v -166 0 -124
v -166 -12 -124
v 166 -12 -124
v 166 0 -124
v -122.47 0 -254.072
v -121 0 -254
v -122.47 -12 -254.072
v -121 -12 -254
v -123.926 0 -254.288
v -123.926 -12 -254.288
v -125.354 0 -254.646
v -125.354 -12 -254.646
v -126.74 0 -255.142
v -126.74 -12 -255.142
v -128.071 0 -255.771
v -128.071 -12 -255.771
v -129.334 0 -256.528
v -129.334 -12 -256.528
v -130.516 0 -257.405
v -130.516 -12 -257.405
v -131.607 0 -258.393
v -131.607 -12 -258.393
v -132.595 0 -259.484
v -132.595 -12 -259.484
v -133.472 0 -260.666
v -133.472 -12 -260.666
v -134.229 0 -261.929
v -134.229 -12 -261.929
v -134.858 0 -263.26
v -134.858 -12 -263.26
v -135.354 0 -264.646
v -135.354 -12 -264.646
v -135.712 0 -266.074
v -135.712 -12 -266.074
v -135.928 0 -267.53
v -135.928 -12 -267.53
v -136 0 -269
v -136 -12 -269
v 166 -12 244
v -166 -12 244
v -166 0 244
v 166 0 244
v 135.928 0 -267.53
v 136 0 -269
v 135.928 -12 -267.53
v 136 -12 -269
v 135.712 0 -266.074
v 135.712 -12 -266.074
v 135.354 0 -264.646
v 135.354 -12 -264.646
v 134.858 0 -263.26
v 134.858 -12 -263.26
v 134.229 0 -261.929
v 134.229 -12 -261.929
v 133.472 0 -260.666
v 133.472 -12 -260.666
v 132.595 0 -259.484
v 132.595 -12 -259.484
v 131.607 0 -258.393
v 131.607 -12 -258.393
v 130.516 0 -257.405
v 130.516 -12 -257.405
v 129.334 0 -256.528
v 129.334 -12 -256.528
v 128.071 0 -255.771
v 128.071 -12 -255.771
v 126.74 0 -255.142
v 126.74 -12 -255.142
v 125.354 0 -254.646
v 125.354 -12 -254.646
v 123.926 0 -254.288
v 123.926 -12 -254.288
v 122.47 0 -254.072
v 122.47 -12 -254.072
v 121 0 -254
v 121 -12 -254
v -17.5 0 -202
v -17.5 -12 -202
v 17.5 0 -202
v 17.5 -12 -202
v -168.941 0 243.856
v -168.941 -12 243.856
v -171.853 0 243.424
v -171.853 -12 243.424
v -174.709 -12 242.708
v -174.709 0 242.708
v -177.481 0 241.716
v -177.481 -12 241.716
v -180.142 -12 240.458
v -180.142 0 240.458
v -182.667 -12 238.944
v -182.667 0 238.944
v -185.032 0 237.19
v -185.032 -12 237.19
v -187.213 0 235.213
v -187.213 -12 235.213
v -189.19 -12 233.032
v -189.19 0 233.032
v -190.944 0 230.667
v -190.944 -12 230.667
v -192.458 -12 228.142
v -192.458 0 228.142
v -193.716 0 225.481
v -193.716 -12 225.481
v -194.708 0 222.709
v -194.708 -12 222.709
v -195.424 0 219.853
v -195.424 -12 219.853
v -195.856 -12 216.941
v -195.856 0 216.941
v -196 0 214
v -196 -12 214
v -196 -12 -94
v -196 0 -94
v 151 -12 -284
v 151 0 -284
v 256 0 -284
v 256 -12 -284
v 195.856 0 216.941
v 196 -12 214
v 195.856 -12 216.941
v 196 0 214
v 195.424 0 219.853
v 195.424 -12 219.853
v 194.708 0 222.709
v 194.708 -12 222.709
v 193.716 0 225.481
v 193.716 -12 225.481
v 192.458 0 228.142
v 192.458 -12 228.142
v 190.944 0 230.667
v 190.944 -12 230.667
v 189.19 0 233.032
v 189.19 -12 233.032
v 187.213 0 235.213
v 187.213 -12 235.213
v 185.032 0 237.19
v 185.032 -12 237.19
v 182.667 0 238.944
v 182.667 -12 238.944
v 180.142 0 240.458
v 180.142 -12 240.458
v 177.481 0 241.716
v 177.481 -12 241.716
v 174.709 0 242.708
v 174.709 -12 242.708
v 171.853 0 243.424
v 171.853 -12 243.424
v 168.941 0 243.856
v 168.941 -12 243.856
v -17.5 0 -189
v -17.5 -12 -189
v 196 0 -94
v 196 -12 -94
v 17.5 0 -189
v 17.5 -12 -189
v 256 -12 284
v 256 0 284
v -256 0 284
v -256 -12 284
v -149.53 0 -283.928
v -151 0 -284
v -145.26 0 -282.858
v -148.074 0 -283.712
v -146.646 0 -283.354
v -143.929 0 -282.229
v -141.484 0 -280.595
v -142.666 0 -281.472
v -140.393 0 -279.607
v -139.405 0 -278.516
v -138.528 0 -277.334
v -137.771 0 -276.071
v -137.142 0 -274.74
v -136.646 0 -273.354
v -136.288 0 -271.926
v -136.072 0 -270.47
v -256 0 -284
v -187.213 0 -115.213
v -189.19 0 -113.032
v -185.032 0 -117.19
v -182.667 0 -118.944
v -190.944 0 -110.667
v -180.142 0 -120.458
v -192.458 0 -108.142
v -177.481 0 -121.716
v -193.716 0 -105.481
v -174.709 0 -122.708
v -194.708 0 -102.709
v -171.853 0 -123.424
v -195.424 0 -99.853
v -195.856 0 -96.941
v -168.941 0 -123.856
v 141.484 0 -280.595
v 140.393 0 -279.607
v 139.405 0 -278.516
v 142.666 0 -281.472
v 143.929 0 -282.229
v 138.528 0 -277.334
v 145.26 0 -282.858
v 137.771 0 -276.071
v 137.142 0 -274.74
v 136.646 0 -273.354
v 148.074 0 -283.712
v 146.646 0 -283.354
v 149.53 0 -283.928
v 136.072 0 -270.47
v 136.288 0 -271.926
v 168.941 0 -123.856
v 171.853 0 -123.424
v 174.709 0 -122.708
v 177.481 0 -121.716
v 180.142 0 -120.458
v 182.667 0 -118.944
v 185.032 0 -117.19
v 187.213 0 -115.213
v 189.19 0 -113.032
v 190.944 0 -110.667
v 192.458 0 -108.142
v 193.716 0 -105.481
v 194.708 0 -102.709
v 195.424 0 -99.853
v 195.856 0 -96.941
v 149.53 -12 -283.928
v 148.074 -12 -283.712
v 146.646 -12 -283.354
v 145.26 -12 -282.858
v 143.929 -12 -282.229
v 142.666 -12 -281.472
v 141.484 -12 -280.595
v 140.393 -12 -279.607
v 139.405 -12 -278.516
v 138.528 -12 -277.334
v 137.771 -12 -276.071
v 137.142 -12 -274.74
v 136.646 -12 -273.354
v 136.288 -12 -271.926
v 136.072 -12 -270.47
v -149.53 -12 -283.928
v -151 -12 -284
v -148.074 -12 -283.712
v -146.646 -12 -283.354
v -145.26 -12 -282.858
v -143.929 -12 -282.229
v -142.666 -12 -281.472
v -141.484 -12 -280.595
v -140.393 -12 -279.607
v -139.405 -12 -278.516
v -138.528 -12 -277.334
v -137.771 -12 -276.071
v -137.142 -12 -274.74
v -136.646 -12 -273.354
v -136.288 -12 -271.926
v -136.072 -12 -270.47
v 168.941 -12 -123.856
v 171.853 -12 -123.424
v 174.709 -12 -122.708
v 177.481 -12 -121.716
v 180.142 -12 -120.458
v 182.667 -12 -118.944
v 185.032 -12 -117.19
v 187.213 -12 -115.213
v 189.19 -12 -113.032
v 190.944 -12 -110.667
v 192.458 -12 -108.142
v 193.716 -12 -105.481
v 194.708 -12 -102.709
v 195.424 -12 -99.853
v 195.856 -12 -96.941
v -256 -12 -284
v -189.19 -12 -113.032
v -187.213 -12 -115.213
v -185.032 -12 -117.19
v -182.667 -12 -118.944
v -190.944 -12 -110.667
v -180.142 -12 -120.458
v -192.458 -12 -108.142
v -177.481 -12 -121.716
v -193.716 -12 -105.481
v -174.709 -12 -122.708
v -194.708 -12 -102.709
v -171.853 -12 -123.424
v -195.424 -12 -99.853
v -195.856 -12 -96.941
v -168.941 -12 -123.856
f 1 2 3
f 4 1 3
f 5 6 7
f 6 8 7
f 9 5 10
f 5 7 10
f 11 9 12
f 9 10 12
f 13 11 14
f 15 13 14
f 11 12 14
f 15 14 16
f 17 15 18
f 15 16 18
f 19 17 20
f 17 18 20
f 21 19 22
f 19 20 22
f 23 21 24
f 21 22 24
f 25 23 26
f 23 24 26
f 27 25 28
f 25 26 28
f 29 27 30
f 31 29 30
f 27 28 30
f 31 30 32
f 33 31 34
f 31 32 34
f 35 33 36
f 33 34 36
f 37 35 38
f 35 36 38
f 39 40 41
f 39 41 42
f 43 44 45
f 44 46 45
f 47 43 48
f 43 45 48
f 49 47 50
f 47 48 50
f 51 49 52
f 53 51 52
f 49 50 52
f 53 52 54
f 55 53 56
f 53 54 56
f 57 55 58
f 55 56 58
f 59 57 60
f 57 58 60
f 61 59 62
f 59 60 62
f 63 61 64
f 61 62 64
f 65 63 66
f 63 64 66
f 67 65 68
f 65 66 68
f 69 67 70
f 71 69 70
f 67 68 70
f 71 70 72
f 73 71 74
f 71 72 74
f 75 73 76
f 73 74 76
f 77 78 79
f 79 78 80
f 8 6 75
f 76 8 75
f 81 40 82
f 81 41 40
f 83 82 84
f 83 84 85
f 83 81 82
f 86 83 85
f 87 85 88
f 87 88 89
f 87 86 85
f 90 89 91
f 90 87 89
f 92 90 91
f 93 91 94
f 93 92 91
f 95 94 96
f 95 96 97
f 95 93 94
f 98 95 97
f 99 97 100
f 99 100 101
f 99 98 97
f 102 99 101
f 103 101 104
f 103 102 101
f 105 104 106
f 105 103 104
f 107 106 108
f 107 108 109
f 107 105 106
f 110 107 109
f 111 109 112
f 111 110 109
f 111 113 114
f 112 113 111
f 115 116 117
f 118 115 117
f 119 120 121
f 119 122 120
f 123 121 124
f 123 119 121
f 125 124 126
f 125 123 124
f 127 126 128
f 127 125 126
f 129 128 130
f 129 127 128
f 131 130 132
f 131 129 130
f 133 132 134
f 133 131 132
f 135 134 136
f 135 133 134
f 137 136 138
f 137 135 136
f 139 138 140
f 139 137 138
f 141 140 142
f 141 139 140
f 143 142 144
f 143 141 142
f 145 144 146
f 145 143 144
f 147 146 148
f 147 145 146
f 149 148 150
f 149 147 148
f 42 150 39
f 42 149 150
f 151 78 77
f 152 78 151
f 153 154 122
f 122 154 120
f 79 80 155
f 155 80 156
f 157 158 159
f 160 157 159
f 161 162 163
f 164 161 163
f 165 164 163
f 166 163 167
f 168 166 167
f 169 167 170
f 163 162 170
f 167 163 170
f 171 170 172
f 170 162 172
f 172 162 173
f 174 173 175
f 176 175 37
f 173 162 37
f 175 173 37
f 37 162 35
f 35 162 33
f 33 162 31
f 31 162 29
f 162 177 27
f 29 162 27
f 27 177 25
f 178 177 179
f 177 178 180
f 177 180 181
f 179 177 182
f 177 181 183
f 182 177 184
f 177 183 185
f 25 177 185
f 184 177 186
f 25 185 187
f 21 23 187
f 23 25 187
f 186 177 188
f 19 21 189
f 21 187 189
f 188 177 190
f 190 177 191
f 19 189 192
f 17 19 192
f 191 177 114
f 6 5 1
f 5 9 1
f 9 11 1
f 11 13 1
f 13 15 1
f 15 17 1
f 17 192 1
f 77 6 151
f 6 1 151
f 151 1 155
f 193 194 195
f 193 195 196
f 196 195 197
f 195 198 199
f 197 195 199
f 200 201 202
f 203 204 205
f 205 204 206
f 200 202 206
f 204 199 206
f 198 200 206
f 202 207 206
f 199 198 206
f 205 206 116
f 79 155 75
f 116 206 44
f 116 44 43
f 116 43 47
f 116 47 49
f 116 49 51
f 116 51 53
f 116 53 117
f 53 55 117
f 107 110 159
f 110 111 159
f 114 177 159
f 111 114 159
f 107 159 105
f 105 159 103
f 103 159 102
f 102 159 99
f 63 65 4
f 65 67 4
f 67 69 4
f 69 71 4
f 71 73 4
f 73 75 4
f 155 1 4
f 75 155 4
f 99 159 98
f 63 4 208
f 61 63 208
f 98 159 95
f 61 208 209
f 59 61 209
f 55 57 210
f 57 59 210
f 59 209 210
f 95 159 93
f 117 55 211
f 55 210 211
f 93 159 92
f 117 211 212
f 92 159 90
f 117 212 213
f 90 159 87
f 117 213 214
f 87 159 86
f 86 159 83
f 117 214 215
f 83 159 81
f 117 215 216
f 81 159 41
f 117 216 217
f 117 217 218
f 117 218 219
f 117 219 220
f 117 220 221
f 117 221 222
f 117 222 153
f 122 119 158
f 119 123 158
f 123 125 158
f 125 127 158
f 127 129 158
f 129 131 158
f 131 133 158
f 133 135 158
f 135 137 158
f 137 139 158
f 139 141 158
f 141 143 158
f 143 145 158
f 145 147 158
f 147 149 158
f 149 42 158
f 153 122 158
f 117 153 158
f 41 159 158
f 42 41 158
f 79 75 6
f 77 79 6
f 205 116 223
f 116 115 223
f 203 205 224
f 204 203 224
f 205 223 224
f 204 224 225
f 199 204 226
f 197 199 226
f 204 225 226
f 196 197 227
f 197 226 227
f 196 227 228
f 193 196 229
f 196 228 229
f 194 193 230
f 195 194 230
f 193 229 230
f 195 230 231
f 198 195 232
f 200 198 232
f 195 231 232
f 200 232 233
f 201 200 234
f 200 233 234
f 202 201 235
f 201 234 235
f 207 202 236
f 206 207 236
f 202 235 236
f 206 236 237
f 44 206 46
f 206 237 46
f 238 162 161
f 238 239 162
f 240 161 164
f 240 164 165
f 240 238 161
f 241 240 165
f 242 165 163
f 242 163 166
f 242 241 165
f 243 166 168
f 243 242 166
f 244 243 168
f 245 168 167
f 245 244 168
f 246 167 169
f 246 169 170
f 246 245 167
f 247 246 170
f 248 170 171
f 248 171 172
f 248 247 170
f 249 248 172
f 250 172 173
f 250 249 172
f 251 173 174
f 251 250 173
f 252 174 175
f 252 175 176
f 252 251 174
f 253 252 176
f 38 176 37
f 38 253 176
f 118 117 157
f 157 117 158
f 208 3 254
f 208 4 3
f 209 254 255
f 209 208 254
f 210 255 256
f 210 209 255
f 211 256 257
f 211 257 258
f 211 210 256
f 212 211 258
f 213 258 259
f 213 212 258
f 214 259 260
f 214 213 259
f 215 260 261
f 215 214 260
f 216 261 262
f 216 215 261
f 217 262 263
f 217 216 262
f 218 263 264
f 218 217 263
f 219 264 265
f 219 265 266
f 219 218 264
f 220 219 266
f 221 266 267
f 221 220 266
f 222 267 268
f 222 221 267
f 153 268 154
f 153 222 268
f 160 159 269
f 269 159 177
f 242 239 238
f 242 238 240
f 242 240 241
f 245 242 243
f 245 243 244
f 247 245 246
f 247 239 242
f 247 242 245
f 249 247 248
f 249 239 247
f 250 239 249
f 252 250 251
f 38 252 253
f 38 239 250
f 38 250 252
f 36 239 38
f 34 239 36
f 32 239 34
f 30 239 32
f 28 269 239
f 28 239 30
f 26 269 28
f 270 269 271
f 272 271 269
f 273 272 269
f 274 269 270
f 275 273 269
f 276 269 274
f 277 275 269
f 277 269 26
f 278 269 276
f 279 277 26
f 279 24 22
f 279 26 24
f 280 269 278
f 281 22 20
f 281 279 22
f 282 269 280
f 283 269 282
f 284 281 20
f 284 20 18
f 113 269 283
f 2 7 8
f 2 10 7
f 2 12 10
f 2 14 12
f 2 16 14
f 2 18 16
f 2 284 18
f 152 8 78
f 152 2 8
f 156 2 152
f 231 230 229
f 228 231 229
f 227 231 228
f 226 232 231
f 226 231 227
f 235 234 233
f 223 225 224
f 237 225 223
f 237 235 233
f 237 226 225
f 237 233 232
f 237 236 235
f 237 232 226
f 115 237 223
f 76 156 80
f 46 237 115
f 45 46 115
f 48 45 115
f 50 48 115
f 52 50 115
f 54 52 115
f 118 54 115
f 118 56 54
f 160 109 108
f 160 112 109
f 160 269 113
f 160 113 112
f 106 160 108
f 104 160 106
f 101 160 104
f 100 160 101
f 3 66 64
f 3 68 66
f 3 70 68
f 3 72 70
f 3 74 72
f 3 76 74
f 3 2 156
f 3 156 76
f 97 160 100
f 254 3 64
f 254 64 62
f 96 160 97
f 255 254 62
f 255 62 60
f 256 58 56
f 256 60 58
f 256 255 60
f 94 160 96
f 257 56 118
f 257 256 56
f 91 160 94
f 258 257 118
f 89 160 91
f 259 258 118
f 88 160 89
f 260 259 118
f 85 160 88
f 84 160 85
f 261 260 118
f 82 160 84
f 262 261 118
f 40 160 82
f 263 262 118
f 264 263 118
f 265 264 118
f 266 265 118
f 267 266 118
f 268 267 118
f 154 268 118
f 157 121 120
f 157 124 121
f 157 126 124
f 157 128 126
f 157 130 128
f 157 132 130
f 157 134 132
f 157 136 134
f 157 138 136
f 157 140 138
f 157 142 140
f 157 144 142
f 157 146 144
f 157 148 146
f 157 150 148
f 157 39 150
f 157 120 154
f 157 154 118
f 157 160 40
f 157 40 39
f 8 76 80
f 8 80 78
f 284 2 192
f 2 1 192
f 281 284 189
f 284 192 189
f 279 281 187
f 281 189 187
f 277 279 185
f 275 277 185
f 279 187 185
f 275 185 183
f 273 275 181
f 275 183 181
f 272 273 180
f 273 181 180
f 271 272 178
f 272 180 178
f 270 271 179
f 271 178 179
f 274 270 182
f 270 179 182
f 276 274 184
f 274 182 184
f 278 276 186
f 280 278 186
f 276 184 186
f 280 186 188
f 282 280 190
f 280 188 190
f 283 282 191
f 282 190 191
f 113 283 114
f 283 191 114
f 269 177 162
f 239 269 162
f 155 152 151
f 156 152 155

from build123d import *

# Parameters (mm, degrees)
F2_DEPTH = 12
F3_W     = 392
F3_H     = 368
F3_W_2   = 35
F3_H_2   = 13
F4_DEPTH = 12
F5_R     = 30
F6_R     = 14.99999


# Not quite as in the source:
# - a fillet or chamfer is up to 0.001 mm smaller than in the source, because OpenCascade refuses the exact size
# - a feature names something its author has since deleted; it is built from what else it names


with BuildPart() as f2:
    # F1 (on Front) → F2 (new body)
    with BuildSketch(Plane.XZ):
        Polygon((256, -284), (256, 284), (-256, 284), (-256, -284), (-136, -284), (-136, -254), (136, -254), (136, -284), align=None)
    extrude(amount=F2_DEPTH)

    # F3 (on face) → F4 (cut, through all)
    with BuildSketch(Plane.XZ.offset(12)):
        with Locations((0, 60)):
            Rectangle(F3_W, F3_H)
        with Locations((0, -195.5)):
            Rectangle(F3_W_2, F3_H_2)
    extrude(amount=-F4_DEPTH, mode=Mode.SUBTRACT)

    # F5
    f5_edges = [f2.edges().sort_by_distance(p)[0] for p in [
        (-196, -6, -124),
        (-196, -6, 244),
        (196, -6, 244),
        (196, -6, -124),
    ]]
    fillet(f5_edges, radius=F5_R)

    # F6 (radius 15 in the source; OpenCascade refuses exactly that, so slightly less here)
    f6_edges = [f2.edges().sort_by_distance(p)[0] for p in [
        (-136, -6, -284),
        (-136, -6, -254),
        (136, -6, -284),
        (136, -6, -254),
    ]]
    fillet(f6_edges, radius=F6_R)


solid = f2.part
